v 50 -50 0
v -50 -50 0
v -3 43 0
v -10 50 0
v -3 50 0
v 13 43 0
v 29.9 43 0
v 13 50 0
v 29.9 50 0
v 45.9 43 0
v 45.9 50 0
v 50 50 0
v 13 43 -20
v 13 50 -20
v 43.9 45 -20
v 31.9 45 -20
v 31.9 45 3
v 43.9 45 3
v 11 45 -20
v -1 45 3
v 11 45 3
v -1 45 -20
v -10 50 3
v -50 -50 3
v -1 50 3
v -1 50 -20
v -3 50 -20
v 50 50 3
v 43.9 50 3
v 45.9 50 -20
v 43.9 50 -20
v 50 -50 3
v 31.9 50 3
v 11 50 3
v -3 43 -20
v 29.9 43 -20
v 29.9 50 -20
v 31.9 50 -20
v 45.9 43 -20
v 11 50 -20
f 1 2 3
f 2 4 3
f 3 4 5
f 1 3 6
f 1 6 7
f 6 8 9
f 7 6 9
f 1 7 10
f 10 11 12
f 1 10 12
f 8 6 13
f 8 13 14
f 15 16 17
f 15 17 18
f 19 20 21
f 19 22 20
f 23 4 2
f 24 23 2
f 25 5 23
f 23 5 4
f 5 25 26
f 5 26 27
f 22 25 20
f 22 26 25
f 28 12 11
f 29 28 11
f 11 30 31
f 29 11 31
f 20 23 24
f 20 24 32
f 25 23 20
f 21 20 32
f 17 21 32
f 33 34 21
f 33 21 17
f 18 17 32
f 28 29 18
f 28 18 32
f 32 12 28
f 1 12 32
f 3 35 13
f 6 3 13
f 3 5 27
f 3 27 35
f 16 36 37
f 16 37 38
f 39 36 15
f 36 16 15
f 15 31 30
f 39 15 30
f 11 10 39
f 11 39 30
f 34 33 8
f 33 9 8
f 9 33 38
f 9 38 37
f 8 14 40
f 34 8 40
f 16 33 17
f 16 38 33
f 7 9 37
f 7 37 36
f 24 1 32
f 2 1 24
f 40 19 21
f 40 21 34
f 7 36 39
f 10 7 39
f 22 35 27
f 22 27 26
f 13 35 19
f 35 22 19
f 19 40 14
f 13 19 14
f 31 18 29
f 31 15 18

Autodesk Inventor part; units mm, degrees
ref_plane "YZ Plane" through (0, 0, 0) normal (1, 0, 0) x (0, 1, 0)
ref_plane "XZ Plane" through (0, 0, 0) normal (0, 1, 0) x (-1, 0, 0)
ref_plane "XY Plane" through (0, 0, 0) normal (0, 0, 1) x (1, 0, 0)
sketch "Sketch1" plane through (0, 0, 0) normal (0, 0, 1) x (1, 0, 0)
  line L0 (50, -50) -> (-50, -50)
  line L1 (50, 50) -> (50, -50)
  line L2 (50, 50) -> (-10, 50)
  line L3 (-10, 50) -> (-50, -50)
  line L4 (-10, 50) -> (20, 50)
  line L5 (20, 50) -> (50, 50)
  line L6 (-1, 45) -> (11, 45)
  line L7 (11, 45) -> (11, 55)
  line L8 (11, 55) -> (-1, 55)
  line L9 (-1, 55) -> (-1, 45)
  line L10 (-1, 45) -> (11, 55) construction
  line L11 (11, 45) -> (-1, 55) construction
  line L12 (50, 50) -> (37.9, 50)
  line L13 (31.9, 45) -> (43.9, 45)
  line L14 (43.9, 45) -> (43.9, 55)
  line L15 (43.9, 55) -> (31.9, 55)
  line L16 (31.9, 55) -> (31.9, 45)
  line L17 (31.9, 45) -> (43.9, 55) construction
  line L18 (43.9, 45) -> (31.9, 55) construction
  line L19 (-3, 50) -> (-3, 43)
  line L20 (-3, 43) -> (13, 43)
  line L21 (13, 43) -> (13, 50)
  line L22 (29.9, 50) -> (29.9, 43)
  line L23 (29.9, 43) -> (45.9, 43)
  line L24 (45.9, 43) -> (45.9, 50)
  point P0 (0, 0)
  point P1 (5, 50)
  point P2 (-1, 50)
  point P3 (45.9, 46.5)
  point P4 (31.9, 50)
  point P5 (43.9, 50)
  point P6 (-1, 50)
  point P7 (11, 50)
  dimension "d18" = 60
  dimension "d19" = 111.801
  dimension "d20" = 100
  dimension "d21" = 100
  dimension "d22" = 50
  dimension "d23" = 50
  dimension "d24" = 30
  dimension "d25" = 12
  dimension "d26" = 10
  dimension "d31" = 12.1
  dimension "d32" = 12
  dimension "d33" = 10
  dimension "d36" = 2
  dimension "d37" = 2
  dimension "d38" = 16
  dimension "d39" = 2
  dimension "d40" = 2
  dimension "d41" = 2
extrude "Extrusion1" add sketch "Sketch1" along normal blind 3 contours L0 L3 L2 L19 L20 L21 L22 L23 L24 L1 | L24 L23 L22 L2 L16 L13 L14 | L2 L9 L6 L7 L21 L20 L19 | L14 L13 L16 L2 | L2 L7 L6 L9
extrude "Extrusion2" cut sketch "Sketch1" along normal blind 10 contours L9 L8 L7 L2 | L2 L7 L6 L9
extrude "Extrusion3" cut sketch "Sketch1" along normal blind 10 contours L14 L13 L16 L2 | L2 L16 L15 L14
extrude "Extrusion4" add sketch "Sketch1" against normal blind 20 contours L24 L23 L22 L2 L16 L13 L14 | L2 L9 L6 L7 L21 L20 L19
sketch "Sketch2" plane through (0, 0, 0) normal (0, 0, 1) x (1, 0, 0)
  line L0 (-52.1328, -49.9469) -> (-12.1328, 50.0531)
  line L1 (-10, 50) -> (-50, -50) projected
  line L2 (-1, 50) -> (-10, 50) projected
  line L3 (-12.1328, 50.0531) -> (-21.8999, 50.0531)
  line L4 (-21.8999, 50.0531) -> (-21.8999, 45)
  line L5 (-21.8999, 45) -> (-33.8999, 45)
  line L6 (-33.8999, 45) -> (-33.8999, 50.0531)
  line L7 (-33.8999, 50.0531) -> (-41.8999, 50.0531)
  line L8 (-52.1328, -49.9469) -> (-67.1328, -49.9469)
  line L9 (-67.1328, -49.9469) -> (-67.1328, -9.9469)
  line L10 (-67.1328, -9.9469) -> (-41.8999, 50.0531)
  line L11 (-67.1328, -4.7877) -> (-44.0696, 50.0531)
  line L12 (-67.1328, -4.7877) -> (-67.1328, 50.0531)
  line L13 (-67.1328, 50.0531) -> (-64.1328, 50.0531)
  line L14 (-64.1328, 50.0531) -> (-64.1328, 45.0531)
  line L15 (-64.1328, 45.0531) -> (-52.1328, 45.0531)
  line L16 (-52.1328, 45.0531) -> (-52.1328, 50.0531)
  line L17 (-52.1328, 50.0531) -> (-44.0696, 50.0531)
  line L18 (-50, -50) -> (50, -50) projected
  point P0 (0, 0)
  dimension "d44" = 20.9
  dimension "d46" = 12
  dimension "d47" = 8
  dimension "d48" = 15
  dimension "d49" = 40
  dimension "d50" = 2
  dimension "d51" = 2
  dimension "d52" = 3
  dimension "d53" = 5
  dimension "d54" = 12
  dimension "d55" = 54.8409
  dimension "d56" = 8.0632
  dimension "d57" = 67.191
  dimension "d58" = 9.7671
  dimension "d59" = 60
  dimension "d60" = 117.1328
  dimension "d61" = 5
properties part number "BasePart"
